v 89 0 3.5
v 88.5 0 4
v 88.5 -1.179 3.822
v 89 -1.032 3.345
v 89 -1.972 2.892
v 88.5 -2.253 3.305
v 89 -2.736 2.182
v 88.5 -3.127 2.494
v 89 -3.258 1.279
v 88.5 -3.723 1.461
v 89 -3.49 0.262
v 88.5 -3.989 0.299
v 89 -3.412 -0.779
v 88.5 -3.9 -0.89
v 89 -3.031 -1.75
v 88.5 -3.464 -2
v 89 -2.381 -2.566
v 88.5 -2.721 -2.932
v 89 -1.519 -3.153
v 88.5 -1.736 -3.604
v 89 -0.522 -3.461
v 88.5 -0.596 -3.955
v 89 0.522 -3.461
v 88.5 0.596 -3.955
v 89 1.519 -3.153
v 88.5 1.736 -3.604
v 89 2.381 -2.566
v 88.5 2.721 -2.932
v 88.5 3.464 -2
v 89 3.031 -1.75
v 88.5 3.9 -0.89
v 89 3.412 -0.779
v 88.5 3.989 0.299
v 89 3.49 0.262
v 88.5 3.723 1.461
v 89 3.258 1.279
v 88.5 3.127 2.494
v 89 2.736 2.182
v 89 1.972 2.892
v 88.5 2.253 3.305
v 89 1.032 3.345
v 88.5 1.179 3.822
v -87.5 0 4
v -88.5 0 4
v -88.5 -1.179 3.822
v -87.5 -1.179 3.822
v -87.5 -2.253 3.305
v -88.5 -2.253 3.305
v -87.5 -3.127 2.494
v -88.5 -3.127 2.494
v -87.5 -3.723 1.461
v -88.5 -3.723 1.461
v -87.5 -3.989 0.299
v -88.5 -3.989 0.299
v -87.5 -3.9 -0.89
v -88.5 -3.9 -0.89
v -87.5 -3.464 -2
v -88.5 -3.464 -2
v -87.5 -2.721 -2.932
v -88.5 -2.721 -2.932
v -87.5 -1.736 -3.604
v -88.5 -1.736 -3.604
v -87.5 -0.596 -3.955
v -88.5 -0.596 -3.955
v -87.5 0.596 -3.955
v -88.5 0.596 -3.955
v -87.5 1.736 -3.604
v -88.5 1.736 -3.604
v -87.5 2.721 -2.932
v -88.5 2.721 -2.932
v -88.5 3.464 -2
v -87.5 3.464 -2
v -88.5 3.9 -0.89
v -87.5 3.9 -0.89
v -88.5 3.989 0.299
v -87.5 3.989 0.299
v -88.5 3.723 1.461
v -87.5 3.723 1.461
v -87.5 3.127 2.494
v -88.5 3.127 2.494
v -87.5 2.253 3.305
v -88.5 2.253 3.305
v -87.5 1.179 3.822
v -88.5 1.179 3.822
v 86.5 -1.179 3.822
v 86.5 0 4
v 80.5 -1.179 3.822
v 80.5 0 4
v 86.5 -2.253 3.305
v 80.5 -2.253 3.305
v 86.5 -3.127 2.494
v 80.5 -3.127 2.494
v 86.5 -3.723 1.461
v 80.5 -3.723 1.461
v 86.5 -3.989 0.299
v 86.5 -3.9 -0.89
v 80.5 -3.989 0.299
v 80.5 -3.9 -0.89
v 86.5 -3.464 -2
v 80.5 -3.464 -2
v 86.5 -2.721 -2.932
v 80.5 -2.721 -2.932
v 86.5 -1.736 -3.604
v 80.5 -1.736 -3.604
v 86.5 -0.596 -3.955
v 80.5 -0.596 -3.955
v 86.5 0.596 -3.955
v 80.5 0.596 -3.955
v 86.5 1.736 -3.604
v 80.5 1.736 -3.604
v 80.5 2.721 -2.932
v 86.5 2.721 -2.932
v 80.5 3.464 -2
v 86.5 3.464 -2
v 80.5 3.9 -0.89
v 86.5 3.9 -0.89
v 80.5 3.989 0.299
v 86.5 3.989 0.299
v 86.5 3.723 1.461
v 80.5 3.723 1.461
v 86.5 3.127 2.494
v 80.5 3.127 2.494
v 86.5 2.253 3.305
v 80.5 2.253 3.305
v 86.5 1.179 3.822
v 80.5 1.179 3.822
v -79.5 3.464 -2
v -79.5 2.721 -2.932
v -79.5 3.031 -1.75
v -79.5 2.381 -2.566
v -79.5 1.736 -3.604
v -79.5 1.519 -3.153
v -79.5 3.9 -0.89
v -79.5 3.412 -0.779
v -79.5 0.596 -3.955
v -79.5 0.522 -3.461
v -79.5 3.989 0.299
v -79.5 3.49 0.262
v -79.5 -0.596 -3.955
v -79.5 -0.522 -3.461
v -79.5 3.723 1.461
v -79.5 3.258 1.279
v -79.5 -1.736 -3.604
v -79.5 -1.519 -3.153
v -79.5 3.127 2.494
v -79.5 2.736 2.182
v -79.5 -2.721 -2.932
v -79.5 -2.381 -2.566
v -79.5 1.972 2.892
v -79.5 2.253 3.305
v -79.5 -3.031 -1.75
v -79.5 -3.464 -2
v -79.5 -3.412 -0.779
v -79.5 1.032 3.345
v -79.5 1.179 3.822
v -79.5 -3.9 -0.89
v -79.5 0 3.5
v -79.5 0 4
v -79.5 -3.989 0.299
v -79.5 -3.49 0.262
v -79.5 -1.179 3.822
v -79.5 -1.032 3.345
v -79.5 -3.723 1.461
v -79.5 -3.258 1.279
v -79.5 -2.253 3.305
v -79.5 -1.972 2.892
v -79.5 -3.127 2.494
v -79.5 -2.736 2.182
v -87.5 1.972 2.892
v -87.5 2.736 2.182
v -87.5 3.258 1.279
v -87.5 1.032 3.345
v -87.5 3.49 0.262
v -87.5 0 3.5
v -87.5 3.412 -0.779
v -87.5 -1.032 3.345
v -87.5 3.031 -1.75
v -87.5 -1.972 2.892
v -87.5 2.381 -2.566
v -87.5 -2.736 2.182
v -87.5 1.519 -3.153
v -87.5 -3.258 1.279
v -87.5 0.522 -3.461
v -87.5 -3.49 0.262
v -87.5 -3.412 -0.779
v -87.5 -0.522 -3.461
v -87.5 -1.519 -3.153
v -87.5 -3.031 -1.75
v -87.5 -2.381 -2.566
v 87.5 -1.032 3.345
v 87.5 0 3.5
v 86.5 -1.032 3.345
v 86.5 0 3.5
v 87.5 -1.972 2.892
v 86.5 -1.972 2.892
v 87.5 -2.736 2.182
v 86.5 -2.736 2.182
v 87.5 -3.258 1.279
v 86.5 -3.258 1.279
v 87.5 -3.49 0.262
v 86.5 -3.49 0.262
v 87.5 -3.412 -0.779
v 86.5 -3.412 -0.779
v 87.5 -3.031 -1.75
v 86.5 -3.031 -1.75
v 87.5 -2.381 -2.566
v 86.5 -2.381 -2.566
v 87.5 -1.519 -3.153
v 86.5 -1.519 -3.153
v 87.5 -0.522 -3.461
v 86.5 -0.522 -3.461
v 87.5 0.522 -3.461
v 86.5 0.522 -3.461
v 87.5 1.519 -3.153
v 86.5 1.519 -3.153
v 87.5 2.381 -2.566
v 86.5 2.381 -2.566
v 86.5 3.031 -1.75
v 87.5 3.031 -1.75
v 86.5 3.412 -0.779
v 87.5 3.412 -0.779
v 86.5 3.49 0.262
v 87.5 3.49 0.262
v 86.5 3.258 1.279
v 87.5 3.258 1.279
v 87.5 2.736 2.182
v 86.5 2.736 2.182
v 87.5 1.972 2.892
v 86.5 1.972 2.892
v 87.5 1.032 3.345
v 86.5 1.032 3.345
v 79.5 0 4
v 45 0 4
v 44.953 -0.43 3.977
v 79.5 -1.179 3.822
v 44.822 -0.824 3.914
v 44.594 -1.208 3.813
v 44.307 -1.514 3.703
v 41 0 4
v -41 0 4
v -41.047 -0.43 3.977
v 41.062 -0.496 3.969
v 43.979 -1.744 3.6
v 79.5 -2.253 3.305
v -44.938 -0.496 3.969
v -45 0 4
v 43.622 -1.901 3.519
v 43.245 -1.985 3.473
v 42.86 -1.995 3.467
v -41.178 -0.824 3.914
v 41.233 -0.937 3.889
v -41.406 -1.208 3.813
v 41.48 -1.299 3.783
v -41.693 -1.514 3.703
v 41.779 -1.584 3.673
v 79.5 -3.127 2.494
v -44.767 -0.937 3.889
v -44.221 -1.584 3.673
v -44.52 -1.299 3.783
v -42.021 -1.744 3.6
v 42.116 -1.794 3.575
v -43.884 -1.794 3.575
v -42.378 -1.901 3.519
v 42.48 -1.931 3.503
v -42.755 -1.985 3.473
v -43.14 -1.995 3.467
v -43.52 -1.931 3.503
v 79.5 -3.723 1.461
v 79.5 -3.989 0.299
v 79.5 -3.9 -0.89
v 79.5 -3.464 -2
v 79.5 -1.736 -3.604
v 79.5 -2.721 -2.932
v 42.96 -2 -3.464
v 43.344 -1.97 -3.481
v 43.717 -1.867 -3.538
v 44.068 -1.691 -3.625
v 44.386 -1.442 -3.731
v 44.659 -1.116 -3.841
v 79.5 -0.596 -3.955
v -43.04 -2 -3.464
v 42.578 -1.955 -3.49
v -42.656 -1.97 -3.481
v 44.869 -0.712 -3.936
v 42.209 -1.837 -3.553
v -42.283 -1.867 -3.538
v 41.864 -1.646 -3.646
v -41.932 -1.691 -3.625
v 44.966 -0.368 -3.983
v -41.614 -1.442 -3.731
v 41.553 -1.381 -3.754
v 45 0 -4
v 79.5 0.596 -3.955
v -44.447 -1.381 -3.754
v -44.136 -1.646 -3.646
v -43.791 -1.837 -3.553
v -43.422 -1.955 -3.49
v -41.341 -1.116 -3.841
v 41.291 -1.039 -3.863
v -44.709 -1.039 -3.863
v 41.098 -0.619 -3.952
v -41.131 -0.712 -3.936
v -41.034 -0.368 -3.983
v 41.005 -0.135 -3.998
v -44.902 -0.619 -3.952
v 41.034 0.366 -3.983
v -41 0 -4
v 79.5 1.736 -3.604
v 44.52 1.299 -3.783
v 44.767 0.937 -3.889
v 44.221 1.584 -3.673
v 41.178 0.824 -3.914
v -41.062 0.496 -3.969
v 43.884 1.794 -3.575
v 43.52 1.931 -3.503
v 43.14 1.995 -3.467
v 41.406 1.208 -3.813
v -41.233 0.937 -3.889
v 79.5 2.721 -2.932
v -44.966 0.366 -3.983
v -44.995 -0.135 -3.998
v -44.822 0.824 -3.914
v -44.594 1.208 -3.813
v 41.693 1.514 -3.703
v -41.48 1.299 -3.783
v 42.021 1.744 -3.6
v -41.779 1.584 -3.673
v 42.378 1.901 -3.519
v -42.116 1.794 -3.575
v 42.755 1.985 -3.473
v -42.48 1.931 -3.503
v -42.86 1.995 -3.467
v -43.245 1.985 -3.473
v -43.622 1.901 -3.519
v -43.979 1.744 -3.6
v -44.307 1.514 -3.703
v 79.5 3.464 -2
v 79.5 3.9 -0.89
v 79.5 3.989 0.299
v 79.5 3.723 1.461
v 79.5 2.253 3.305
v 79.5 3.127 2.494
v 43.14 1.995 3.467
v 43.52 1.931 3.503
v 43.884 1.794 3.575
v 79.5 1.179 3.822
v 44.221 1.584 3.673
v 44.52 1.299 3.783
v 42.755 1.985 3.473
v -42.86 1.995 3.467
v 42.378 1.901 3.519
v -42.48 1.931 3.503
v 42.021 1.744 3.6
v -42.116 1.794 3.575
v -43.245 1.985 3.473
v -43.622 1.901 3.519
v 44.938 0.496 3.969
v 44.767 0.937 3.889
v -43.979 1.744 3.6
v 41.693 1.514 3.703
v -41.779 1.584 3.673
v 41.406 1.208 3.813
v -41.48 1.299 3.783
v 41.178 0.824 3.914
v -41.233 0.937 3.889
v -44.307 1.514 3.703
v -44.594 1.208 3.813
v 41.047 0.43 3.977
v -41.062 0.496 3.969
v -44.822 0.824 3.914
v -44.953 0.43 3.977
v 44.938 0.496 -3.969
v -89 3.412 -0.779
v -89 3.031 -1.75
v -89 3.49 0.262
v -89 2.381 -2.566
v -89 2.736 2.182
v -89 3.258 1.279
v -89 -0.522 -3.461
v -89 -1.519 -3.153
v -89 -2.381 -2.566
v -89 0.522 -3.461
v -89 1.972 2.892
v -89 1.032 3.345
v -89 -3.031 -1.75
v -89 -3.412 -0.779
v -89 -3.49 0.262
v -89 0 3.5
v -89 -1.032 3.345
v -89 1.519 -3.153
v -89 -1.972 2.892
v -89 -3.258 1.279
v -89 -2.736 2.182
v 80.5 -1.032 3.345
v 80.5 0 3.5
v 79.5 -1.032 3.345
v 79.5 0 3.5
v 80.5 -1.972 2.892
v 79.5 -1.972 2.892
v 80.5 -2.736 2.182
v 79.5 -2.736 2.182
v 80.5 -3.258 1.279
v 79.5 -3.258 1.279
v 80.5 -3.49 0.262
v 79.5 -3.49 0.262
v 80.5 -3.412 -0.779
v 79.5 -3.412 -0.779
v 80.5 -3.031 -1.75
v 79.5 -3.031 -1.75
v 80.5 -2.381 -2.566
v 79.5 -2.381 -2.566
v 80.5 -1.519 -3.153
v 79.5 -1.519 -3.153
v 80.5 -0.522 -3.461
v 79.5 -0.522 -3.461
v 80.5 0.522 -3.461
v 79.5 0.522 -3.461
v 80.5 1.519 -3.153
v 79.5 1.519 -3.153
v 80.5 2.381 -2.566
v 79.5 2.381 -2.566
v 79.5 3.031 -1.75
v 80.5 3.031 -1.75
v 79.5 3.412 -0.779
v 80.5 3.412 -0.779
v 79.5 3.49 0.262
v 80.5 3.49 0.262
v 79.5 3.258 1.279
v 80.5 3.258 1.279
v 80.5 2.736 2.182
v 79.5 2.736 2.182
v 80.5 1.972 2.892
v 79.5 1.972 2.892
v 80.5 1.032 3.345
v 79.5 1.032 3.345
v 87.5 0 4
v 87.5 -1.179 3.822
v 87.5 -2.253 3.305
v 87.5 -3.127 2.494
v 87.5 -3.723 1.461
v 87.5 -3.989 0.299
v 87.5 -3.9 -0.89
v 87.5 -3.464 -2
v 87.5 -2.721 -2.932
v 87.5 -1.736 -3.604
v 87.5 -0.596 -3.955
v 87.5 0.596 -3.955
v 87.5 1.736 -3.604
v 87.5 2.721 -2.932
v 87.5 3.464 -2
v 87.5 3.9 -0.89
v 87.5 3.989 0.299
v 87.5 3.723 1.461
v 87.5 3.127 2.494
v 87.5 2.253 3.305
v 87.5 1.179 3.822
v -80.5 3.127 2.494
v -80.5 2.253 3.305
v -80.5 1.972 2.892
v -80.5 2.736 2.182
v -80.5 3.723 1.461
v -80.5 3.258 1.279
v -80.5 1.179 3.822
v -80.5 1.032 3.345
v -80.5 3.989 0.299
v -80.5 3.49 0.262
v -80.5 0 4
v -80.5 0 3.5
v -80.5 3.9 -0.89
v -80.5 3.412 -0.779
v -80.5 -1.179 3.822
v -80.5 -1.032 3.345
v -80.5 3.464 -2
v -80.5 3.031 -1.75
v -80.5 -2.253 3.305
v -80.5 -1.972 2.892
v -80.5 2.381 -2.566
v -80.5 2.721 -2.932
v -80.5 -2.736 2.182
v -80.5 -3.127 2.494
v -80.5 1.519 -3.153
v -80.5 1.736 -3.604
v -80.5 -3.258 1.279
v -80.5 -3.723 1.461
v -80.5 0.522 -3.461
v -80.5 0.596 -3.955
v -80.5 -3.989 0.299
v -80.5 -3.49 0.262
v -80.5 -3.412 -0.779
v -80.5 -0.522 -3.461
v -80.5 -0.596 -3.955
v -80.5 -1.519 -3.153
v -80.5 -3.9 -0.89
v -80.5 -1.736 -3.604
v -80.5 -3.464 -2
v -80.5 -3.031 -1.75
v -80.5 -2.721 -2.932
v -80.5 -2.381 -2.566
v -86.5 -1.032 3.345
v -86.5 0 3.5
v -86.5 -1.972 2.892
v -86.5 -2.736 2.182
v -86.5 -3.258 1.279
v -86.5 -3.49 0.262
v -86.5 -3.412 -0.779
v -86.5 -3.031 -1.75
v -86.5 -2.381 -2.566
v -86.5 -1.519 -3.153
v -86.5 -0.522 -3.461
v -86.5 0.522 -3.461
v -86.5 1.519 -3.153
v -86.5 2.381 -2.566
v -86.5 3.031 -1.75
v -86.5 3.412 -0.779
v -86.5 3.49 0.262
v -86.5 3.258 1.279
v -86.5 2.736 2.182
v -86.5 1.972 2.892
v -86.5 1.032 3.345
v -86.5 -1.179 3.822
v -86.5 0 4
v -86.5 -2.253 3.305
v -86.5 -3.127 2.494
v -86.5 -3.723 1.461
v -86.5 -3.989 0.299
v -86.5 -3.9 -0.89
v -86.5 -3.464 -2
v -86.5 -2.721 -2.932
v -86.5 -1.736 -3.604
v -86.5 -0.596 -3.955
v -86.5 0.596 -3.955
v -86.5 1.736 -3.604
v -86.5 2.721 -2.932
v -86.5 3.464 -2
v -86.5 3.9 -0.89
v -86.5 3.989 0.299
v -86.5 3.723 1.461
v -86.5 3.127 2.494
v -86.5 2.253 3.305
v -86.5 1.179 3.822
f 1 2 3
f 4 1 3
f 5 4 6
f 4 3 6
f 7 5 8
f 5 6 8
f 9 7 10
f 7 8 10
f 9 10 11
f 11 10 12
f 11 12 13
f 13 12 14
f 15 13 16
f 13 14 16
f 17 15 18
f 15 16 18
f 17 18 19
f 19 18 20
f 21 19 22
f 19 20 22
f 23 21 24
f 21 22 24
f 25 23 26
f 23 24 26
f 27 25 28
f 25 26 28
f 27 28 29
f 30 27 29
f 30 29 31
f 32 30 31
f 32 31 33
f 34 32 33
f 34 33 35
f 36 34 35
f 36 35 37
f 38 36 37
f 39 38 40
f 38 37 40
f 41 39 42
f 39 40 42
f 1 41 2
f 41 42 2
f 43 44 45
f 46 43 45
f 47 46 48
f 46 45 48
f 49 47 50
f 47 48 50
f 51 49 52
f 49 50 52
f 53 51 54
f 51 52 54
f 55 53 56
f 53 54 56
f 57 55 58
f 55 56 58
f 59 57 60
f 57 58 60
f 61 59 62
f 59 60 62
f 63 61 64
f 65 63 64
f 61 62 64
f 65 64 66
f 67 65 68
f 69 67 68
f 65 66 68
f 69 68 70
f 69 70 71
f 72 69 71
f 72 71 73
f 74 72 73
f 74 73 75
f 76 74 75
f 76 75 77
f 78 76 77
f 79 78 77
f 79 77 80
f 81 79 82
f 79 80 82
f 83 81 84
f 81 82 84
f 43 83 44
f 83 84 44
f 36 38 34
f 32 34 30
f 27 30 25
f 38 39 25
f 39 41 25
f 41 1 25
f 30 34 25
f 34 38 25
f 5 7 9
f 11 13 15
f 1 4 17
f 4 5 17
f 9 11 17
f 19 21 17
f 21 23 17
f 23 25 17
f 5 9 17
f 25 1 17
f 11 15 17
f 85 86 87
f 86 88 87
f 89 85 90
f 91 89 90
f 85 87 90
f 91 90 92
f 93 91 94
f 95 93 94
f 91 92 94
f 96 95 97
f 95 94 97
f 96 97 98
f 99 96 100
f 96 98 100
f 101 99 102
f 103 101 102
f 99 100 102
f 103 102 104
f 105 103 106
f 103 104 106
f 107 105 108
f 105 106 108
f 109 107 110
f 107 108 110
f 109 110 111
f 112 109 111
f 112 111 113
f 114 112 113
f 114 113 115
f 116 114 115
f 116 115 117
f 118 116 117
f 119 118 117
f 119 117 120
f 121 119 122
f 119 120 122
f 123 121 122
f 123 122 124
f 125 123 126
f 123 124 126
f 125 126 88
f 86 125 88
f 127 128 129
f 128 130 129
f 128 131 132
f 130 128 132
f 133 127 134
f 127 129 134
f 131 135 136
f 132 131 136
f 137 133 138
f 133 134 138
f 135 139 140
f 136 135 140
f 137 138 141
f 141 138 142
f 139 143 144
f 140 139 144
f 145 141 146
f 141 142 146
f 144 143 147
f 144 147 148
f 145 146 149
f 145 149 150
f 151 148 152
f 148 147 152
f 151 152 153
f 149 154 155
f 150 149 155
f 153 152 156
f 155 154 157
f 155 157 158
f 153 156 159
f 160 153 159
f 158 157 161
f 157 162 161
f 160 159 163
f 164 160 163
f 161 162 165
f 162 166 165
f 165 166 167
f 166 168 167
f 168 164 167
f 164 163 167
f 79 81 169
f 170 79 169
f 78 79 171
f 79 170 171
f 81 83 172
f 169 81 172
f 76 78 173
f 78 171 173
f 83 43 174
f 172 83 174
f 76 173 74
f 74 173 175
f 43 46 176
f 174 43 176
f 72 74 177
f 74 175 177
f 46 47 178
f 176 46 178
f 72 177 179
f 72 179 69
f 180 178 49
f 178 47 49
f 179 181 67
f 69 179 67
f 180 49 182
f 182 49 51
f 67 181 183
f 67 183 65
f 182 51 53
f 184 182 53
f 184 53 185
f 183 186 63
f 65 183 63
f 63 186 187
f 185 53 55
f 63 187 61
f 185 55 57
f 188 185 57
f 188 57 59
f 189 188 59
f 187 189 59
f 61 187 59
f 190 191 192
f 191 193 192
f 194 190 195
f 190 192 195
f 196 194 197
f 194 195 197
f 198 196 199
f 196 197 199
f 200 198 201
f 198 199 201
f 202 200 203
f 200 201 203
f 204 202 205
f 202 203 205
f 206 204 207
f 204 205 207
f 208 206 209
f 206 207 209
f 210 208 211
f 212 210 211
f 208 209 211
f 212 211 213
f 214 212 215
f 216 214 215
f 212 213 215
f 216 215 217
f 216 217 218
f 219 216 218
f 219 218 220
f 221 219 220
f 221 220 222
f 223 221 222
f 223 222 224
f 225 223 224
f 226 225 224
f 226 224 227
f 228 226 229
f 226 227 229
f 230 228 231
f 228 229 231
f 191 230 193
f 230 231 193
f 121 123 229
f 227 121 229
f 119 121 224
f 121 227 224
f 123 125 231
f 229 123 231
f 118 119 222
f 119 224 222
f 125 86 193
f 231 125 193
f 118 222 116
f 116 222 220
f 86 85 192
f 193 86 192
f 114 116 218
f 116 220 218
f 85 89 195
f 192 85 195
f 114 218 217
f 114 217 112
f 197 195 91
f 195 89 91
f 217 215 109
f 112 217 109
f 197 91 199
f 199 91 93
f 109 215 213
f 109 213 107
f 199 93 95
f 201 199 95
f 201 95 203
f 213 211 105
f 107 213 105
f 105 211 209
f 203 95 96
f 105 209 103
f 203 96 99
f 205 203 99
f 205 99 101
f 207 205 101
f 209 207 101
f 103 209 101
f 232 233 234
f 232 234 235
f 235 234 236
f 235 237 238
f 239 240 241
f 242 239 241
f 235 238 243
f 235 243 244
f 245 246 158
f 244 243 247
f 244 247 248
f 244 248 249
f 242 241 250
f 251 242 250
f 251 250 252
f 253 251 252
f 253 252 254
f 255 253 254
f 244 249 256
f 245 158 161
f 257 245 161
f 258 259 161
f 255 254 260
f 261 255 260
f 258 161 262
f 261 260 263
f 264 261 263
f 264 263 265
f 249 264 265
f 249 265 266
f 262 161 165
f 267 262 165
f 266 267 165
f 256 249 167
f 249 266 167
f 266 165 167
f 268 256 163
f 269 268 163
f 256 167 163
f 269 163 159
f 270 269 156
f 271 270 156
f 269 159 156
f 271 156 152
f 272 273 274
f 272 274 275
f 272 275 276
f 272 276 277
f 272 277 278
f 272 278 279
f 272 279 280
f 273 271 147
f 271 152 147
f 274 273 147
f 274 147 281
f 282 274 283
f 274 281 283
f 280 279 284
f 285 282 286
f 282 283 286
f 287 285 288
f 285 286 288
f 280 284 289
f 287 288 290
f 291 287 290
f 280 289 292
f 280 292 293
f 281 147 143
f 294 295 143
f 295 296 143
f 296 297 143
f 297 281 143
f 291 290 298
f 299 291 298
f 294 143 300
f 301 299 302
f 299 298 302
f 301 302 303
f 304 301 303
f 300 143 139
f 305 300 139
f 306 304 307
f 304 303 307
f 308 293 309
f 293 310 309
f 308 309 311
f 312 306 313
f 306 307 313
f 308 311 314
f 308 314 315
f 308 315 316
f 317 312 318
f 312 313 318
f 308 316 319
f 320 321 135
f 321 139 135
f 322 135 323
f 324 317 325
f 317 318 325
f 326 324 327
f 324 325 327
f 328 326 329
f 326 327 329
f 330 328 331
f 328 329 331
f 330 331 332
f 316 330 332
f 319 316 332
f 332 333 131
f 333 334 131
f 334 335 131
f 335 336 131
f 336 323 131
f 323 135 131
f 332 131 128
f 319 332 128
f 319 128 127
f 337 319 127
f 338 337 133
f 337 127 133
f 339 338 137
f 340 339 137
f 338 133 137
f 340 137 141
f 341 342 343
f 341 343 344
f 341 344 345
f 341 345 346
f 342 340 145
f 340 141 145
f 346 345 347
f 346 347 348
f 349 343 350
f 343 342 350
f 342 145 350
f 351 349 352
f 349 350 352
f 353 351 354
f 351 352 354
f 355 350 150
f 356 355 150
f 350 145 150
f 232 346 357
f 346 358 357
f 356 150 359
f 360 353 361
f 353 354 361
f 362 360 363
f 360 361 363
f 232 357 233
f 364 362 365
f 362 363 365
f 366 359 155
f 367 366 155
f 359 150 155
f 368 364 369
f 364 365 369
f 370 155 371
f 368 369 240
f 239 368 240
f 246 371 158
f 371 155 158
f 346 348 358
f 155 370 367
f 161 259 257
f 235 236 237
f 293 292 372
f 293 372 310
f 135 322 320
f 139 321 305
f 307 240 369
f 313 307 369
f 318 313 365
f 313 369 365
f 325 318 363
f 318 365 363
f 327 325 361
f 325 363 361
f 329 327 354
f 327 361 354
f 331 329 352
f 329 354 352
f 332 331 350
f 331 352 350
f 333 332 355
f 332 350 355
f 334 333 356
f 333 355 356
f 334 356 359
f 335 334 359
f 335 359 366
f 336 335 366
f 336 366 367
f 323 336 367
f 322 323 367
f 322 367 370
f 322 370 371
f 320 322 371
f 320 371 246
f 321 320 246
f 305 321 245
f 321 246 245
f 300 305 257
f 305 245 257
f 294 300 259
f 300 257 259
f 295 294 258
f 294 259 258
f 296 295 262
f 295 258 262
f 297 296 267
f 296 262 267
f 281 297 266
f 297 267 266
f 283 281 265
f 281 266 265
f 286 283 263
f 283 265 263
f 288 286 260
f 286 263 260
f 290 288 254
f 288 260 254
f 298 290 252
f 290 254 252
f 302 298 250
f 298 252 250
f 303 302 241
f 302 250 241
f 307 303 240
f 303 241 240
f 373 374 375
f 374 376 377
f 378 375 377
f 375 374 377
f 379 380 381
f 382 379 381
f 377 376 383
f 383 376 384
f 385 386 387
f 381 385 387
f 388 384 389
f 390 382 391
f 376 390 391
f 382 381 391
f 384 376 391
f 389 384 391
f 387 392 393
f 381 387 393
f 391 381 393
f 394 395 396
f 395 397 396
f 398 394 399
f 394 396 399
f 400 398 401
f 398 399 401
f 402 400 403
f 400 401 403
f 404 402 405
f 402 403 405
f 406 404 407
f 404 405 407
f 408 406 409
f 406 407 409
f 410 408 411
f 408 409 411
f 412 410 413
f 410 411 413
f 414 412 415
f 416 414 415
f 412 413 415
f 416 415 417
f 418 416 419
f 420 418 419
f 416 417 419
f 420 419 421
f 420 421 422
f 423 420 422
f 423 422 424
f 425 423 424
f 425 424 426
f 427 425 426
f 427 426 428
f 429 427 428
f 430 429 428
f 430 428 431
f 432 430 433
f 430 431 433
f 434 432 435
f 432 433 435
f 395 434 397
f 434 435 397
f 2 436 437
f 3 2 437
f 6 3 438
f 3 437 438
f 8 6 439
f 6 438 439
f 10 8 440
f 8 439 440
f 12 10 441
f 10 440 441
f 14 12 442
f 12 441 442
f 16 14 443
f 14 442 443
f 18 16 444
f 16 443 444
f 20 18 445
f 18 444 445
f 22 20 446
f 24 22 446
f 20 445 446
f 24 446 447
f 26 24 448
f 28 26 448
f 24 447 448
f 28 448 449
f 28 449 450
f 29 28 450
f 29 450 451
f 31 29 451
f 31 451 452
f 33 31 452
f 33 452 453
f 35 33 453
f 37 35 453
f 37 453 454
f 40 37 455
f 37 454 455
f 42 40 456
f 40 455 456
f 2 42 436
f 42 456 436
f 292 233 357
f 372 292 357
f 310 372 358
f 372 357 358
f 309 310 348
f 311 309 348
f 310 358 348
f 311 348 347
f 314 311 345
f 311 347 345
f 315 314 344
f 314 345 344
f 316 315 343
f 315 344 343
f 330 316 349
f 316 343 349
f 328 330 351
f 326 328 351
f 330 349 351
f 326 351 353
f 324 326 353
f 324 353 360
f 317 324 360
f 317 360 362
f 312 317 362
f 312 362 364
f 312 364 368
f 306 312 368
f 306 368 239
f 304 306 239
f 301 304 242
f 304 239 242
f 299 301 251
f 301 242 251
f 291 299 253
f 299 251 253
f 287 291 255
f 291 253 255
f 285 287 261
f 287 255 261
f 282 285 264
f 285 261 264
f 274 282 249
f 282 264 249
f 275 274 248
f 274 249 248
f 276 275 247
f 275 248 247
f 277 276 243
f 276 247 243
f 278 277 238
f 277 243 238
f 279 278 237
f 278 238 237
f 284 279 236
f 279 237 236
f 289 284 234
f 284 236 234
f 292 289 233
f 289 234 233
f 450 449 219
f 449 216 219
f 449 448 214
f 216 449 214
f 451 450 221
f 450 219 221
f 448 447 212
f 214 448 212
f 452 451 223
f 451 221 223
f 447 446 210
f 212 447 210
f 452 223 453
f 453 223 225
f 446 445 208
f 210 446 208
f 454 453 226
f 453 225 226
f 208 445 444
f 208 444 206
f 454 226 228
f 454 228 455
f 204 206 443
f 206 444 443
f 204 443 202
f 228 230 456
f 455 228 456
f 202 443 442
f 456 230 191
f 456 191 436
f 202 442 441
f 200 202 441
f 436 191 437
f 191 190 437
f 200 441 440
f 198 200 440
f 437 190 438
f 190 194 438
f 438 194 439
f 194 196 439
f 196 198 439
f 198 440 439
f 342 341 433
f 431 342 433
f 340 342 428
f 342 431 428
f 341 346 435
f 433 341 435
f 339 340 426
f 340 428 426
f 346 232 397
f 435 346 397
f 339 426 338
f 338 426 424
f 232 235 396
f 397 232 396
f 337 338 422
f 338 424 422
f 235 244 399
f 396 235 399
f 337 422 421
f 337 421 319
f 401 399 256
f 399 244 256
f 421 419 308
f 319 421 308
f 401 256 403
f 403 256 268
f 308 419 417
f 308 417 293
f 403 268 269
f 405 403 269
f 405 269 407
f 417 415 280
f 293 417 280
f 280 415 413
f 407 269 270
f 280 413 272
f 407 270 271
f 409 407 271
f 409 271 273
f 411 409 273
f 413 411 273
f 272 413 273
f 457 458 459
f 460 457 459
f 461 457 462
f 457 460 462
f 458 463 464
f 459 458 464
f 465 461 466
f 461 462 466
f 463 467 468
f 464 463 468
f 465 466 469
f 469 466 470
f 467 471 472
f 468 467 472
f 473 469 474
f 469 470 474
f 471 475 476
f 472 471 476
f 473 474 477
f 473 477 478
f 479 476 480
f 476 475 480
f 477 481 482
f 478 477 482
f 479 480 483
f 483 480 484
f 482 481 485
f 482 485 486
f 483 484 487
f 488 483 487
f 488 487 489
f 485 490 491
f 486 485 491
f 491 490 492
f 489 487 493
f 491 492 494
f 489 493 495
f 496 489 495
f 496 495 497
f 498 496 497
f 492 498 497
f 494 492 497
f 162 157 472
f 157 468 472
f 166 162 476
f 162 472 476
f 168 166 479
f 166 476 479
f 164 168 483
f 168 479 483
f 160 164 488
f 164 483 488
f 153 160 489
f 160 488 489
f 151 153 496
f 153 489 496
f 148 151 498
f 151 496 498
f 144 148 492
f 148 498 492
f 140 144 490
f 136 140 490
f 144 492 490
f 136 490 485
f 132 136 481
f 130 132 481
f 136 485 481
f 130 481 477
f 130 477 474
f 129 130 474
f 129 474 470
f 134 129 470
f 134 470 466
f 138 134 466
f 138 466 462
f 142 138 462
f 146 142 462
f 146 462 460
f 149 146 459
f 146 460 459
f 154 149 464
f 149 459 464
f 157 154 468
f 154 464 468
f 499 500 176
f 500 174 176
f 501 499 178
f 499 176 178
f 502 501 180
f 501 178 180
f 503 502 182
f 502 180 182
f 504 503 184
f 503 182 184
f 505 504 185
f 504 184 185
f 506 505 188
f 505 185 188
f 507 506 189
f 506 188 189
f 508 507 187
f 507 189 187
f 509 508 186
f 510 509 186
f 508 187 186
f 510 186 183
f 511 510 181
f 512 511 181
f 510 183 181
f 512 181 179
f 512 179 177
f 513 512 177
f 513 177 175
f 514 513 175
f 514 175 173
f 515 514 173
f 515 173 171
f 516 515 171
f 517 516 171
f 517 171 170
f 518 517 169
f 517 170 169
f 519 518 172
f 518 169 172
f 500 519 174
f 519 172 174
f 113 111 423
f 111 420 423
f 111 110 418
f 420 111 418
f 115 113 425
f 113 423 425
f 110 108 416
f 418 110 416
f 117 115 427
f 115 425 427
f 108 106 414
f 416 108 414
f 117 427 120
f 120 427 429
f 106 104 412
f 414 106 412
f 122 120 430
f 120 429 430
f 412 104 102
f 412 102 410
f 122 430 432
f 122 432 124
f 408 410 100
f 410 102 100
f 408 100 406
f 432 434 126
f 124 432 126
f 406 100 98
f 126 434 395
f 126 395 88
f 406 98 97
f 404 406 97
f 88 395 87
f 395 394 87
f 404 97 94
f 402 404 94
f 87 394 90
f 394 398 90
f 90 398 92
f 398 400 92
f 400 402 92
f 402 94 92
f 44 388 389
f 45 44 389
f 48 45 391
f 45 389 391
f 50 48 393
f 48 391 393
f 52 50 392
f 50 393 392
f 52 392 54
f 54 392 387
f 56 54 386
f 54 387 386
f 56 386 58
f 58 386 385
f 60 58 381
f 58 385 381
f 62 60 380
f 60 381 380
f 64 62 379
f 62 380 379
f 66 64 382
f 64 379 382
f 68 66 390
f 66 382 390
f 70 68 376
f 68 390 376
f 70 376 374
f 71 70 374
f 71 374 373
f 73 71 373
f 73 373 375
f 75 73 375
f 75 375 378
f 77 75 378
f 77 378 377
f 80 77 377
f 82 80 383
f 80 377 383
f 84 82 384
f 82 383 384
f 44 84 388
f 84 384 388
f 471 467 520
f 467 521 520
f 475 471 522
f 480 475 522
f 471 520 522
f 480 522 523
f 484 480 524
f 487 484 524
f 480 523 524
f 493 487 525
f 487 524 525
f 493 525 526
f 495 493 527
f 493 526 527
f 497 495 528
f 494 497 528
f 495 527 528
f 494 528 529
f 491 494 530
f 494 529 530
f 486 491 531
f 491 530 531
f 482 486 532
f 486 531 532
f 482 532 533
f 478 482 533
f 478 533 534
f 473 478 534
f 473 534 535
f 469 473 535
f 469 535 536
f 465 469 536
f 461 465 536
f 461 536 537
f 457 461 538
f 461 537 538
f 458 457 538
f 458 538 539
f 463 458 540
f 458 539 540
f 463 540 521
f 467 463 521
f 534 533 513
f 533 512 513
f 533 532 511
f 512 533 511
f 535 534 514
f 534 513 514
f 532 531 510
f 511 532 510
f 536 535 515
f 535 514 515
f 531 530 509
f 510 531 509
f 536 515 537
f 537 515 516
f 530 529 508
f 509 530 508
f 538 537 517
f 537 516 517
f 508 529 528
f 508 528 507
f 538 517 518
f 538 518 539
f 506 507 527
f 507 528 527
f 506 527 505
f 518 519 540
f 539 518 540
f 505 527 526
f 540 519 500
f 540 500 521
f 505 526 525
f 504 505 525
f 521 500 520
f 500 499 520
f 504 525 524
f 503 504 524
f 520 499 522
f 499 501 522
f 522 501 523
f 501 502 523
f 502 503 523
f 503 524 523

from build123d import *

# Parameters (mm, degrees)
CHAMFER_1_SIZE      = 0.5
SKETCH_2_R          = 2
CUT_EXTRUDE_1_DEPTH = 9


with BuildPart() as part:
    # 草图1 → 旋转1 (revolve)
    with BuildSketch(Plane.XY, mode=Mode.PRIVATE) as revolve_1_sk:
        Polygon((-89, 0), (89, 0), (89, 4), (87.5, 4), (87.5, 3.5), (86.5, 3.5), (86.5, 4), (80.5, 4), (80.5, 3.5), (79.5, 3.5), (79.5, 4), (-79.5, 4), (-79.5, 3.5), (-80.5, 3.5), (-80.5, 4), (-86.5, 4), (-86.5, 3.5), (-87.5, 3.5), (-87.5, 4), (-89, 4), align=None)
    revolve(revolve_1_sk.sketch.rotate(Axis((25.510334062, 0, 0), (1, 0, 0)), 90), axis=Axis((25.510334062, 0, 0), (1, 0, 0)))

    # 倒角1
    chamfer_1_edges = [part.edges().sort_by_distance(p)[0] for p in [
        (89, 0, -4),
        (-89, 0, -4),
    ]]
    chamfer(chamfer_1_edges, length=CHAMFER_1_SIZE)

    # 草图2 → 切除-拉伸1 (cut)
    with BuildSketch(Plane.XY.offset(5)):
        with Locations((43, 0)):
            Circle(SKETCH_2_R)
        with Locations((-43, 0)):
            Circle(SKETCH_2_R)
    extrude(amount=-CUT_EXTRUDE_1_DEPTH, mode=Mode.SUBTRACT)


solid = part.part
